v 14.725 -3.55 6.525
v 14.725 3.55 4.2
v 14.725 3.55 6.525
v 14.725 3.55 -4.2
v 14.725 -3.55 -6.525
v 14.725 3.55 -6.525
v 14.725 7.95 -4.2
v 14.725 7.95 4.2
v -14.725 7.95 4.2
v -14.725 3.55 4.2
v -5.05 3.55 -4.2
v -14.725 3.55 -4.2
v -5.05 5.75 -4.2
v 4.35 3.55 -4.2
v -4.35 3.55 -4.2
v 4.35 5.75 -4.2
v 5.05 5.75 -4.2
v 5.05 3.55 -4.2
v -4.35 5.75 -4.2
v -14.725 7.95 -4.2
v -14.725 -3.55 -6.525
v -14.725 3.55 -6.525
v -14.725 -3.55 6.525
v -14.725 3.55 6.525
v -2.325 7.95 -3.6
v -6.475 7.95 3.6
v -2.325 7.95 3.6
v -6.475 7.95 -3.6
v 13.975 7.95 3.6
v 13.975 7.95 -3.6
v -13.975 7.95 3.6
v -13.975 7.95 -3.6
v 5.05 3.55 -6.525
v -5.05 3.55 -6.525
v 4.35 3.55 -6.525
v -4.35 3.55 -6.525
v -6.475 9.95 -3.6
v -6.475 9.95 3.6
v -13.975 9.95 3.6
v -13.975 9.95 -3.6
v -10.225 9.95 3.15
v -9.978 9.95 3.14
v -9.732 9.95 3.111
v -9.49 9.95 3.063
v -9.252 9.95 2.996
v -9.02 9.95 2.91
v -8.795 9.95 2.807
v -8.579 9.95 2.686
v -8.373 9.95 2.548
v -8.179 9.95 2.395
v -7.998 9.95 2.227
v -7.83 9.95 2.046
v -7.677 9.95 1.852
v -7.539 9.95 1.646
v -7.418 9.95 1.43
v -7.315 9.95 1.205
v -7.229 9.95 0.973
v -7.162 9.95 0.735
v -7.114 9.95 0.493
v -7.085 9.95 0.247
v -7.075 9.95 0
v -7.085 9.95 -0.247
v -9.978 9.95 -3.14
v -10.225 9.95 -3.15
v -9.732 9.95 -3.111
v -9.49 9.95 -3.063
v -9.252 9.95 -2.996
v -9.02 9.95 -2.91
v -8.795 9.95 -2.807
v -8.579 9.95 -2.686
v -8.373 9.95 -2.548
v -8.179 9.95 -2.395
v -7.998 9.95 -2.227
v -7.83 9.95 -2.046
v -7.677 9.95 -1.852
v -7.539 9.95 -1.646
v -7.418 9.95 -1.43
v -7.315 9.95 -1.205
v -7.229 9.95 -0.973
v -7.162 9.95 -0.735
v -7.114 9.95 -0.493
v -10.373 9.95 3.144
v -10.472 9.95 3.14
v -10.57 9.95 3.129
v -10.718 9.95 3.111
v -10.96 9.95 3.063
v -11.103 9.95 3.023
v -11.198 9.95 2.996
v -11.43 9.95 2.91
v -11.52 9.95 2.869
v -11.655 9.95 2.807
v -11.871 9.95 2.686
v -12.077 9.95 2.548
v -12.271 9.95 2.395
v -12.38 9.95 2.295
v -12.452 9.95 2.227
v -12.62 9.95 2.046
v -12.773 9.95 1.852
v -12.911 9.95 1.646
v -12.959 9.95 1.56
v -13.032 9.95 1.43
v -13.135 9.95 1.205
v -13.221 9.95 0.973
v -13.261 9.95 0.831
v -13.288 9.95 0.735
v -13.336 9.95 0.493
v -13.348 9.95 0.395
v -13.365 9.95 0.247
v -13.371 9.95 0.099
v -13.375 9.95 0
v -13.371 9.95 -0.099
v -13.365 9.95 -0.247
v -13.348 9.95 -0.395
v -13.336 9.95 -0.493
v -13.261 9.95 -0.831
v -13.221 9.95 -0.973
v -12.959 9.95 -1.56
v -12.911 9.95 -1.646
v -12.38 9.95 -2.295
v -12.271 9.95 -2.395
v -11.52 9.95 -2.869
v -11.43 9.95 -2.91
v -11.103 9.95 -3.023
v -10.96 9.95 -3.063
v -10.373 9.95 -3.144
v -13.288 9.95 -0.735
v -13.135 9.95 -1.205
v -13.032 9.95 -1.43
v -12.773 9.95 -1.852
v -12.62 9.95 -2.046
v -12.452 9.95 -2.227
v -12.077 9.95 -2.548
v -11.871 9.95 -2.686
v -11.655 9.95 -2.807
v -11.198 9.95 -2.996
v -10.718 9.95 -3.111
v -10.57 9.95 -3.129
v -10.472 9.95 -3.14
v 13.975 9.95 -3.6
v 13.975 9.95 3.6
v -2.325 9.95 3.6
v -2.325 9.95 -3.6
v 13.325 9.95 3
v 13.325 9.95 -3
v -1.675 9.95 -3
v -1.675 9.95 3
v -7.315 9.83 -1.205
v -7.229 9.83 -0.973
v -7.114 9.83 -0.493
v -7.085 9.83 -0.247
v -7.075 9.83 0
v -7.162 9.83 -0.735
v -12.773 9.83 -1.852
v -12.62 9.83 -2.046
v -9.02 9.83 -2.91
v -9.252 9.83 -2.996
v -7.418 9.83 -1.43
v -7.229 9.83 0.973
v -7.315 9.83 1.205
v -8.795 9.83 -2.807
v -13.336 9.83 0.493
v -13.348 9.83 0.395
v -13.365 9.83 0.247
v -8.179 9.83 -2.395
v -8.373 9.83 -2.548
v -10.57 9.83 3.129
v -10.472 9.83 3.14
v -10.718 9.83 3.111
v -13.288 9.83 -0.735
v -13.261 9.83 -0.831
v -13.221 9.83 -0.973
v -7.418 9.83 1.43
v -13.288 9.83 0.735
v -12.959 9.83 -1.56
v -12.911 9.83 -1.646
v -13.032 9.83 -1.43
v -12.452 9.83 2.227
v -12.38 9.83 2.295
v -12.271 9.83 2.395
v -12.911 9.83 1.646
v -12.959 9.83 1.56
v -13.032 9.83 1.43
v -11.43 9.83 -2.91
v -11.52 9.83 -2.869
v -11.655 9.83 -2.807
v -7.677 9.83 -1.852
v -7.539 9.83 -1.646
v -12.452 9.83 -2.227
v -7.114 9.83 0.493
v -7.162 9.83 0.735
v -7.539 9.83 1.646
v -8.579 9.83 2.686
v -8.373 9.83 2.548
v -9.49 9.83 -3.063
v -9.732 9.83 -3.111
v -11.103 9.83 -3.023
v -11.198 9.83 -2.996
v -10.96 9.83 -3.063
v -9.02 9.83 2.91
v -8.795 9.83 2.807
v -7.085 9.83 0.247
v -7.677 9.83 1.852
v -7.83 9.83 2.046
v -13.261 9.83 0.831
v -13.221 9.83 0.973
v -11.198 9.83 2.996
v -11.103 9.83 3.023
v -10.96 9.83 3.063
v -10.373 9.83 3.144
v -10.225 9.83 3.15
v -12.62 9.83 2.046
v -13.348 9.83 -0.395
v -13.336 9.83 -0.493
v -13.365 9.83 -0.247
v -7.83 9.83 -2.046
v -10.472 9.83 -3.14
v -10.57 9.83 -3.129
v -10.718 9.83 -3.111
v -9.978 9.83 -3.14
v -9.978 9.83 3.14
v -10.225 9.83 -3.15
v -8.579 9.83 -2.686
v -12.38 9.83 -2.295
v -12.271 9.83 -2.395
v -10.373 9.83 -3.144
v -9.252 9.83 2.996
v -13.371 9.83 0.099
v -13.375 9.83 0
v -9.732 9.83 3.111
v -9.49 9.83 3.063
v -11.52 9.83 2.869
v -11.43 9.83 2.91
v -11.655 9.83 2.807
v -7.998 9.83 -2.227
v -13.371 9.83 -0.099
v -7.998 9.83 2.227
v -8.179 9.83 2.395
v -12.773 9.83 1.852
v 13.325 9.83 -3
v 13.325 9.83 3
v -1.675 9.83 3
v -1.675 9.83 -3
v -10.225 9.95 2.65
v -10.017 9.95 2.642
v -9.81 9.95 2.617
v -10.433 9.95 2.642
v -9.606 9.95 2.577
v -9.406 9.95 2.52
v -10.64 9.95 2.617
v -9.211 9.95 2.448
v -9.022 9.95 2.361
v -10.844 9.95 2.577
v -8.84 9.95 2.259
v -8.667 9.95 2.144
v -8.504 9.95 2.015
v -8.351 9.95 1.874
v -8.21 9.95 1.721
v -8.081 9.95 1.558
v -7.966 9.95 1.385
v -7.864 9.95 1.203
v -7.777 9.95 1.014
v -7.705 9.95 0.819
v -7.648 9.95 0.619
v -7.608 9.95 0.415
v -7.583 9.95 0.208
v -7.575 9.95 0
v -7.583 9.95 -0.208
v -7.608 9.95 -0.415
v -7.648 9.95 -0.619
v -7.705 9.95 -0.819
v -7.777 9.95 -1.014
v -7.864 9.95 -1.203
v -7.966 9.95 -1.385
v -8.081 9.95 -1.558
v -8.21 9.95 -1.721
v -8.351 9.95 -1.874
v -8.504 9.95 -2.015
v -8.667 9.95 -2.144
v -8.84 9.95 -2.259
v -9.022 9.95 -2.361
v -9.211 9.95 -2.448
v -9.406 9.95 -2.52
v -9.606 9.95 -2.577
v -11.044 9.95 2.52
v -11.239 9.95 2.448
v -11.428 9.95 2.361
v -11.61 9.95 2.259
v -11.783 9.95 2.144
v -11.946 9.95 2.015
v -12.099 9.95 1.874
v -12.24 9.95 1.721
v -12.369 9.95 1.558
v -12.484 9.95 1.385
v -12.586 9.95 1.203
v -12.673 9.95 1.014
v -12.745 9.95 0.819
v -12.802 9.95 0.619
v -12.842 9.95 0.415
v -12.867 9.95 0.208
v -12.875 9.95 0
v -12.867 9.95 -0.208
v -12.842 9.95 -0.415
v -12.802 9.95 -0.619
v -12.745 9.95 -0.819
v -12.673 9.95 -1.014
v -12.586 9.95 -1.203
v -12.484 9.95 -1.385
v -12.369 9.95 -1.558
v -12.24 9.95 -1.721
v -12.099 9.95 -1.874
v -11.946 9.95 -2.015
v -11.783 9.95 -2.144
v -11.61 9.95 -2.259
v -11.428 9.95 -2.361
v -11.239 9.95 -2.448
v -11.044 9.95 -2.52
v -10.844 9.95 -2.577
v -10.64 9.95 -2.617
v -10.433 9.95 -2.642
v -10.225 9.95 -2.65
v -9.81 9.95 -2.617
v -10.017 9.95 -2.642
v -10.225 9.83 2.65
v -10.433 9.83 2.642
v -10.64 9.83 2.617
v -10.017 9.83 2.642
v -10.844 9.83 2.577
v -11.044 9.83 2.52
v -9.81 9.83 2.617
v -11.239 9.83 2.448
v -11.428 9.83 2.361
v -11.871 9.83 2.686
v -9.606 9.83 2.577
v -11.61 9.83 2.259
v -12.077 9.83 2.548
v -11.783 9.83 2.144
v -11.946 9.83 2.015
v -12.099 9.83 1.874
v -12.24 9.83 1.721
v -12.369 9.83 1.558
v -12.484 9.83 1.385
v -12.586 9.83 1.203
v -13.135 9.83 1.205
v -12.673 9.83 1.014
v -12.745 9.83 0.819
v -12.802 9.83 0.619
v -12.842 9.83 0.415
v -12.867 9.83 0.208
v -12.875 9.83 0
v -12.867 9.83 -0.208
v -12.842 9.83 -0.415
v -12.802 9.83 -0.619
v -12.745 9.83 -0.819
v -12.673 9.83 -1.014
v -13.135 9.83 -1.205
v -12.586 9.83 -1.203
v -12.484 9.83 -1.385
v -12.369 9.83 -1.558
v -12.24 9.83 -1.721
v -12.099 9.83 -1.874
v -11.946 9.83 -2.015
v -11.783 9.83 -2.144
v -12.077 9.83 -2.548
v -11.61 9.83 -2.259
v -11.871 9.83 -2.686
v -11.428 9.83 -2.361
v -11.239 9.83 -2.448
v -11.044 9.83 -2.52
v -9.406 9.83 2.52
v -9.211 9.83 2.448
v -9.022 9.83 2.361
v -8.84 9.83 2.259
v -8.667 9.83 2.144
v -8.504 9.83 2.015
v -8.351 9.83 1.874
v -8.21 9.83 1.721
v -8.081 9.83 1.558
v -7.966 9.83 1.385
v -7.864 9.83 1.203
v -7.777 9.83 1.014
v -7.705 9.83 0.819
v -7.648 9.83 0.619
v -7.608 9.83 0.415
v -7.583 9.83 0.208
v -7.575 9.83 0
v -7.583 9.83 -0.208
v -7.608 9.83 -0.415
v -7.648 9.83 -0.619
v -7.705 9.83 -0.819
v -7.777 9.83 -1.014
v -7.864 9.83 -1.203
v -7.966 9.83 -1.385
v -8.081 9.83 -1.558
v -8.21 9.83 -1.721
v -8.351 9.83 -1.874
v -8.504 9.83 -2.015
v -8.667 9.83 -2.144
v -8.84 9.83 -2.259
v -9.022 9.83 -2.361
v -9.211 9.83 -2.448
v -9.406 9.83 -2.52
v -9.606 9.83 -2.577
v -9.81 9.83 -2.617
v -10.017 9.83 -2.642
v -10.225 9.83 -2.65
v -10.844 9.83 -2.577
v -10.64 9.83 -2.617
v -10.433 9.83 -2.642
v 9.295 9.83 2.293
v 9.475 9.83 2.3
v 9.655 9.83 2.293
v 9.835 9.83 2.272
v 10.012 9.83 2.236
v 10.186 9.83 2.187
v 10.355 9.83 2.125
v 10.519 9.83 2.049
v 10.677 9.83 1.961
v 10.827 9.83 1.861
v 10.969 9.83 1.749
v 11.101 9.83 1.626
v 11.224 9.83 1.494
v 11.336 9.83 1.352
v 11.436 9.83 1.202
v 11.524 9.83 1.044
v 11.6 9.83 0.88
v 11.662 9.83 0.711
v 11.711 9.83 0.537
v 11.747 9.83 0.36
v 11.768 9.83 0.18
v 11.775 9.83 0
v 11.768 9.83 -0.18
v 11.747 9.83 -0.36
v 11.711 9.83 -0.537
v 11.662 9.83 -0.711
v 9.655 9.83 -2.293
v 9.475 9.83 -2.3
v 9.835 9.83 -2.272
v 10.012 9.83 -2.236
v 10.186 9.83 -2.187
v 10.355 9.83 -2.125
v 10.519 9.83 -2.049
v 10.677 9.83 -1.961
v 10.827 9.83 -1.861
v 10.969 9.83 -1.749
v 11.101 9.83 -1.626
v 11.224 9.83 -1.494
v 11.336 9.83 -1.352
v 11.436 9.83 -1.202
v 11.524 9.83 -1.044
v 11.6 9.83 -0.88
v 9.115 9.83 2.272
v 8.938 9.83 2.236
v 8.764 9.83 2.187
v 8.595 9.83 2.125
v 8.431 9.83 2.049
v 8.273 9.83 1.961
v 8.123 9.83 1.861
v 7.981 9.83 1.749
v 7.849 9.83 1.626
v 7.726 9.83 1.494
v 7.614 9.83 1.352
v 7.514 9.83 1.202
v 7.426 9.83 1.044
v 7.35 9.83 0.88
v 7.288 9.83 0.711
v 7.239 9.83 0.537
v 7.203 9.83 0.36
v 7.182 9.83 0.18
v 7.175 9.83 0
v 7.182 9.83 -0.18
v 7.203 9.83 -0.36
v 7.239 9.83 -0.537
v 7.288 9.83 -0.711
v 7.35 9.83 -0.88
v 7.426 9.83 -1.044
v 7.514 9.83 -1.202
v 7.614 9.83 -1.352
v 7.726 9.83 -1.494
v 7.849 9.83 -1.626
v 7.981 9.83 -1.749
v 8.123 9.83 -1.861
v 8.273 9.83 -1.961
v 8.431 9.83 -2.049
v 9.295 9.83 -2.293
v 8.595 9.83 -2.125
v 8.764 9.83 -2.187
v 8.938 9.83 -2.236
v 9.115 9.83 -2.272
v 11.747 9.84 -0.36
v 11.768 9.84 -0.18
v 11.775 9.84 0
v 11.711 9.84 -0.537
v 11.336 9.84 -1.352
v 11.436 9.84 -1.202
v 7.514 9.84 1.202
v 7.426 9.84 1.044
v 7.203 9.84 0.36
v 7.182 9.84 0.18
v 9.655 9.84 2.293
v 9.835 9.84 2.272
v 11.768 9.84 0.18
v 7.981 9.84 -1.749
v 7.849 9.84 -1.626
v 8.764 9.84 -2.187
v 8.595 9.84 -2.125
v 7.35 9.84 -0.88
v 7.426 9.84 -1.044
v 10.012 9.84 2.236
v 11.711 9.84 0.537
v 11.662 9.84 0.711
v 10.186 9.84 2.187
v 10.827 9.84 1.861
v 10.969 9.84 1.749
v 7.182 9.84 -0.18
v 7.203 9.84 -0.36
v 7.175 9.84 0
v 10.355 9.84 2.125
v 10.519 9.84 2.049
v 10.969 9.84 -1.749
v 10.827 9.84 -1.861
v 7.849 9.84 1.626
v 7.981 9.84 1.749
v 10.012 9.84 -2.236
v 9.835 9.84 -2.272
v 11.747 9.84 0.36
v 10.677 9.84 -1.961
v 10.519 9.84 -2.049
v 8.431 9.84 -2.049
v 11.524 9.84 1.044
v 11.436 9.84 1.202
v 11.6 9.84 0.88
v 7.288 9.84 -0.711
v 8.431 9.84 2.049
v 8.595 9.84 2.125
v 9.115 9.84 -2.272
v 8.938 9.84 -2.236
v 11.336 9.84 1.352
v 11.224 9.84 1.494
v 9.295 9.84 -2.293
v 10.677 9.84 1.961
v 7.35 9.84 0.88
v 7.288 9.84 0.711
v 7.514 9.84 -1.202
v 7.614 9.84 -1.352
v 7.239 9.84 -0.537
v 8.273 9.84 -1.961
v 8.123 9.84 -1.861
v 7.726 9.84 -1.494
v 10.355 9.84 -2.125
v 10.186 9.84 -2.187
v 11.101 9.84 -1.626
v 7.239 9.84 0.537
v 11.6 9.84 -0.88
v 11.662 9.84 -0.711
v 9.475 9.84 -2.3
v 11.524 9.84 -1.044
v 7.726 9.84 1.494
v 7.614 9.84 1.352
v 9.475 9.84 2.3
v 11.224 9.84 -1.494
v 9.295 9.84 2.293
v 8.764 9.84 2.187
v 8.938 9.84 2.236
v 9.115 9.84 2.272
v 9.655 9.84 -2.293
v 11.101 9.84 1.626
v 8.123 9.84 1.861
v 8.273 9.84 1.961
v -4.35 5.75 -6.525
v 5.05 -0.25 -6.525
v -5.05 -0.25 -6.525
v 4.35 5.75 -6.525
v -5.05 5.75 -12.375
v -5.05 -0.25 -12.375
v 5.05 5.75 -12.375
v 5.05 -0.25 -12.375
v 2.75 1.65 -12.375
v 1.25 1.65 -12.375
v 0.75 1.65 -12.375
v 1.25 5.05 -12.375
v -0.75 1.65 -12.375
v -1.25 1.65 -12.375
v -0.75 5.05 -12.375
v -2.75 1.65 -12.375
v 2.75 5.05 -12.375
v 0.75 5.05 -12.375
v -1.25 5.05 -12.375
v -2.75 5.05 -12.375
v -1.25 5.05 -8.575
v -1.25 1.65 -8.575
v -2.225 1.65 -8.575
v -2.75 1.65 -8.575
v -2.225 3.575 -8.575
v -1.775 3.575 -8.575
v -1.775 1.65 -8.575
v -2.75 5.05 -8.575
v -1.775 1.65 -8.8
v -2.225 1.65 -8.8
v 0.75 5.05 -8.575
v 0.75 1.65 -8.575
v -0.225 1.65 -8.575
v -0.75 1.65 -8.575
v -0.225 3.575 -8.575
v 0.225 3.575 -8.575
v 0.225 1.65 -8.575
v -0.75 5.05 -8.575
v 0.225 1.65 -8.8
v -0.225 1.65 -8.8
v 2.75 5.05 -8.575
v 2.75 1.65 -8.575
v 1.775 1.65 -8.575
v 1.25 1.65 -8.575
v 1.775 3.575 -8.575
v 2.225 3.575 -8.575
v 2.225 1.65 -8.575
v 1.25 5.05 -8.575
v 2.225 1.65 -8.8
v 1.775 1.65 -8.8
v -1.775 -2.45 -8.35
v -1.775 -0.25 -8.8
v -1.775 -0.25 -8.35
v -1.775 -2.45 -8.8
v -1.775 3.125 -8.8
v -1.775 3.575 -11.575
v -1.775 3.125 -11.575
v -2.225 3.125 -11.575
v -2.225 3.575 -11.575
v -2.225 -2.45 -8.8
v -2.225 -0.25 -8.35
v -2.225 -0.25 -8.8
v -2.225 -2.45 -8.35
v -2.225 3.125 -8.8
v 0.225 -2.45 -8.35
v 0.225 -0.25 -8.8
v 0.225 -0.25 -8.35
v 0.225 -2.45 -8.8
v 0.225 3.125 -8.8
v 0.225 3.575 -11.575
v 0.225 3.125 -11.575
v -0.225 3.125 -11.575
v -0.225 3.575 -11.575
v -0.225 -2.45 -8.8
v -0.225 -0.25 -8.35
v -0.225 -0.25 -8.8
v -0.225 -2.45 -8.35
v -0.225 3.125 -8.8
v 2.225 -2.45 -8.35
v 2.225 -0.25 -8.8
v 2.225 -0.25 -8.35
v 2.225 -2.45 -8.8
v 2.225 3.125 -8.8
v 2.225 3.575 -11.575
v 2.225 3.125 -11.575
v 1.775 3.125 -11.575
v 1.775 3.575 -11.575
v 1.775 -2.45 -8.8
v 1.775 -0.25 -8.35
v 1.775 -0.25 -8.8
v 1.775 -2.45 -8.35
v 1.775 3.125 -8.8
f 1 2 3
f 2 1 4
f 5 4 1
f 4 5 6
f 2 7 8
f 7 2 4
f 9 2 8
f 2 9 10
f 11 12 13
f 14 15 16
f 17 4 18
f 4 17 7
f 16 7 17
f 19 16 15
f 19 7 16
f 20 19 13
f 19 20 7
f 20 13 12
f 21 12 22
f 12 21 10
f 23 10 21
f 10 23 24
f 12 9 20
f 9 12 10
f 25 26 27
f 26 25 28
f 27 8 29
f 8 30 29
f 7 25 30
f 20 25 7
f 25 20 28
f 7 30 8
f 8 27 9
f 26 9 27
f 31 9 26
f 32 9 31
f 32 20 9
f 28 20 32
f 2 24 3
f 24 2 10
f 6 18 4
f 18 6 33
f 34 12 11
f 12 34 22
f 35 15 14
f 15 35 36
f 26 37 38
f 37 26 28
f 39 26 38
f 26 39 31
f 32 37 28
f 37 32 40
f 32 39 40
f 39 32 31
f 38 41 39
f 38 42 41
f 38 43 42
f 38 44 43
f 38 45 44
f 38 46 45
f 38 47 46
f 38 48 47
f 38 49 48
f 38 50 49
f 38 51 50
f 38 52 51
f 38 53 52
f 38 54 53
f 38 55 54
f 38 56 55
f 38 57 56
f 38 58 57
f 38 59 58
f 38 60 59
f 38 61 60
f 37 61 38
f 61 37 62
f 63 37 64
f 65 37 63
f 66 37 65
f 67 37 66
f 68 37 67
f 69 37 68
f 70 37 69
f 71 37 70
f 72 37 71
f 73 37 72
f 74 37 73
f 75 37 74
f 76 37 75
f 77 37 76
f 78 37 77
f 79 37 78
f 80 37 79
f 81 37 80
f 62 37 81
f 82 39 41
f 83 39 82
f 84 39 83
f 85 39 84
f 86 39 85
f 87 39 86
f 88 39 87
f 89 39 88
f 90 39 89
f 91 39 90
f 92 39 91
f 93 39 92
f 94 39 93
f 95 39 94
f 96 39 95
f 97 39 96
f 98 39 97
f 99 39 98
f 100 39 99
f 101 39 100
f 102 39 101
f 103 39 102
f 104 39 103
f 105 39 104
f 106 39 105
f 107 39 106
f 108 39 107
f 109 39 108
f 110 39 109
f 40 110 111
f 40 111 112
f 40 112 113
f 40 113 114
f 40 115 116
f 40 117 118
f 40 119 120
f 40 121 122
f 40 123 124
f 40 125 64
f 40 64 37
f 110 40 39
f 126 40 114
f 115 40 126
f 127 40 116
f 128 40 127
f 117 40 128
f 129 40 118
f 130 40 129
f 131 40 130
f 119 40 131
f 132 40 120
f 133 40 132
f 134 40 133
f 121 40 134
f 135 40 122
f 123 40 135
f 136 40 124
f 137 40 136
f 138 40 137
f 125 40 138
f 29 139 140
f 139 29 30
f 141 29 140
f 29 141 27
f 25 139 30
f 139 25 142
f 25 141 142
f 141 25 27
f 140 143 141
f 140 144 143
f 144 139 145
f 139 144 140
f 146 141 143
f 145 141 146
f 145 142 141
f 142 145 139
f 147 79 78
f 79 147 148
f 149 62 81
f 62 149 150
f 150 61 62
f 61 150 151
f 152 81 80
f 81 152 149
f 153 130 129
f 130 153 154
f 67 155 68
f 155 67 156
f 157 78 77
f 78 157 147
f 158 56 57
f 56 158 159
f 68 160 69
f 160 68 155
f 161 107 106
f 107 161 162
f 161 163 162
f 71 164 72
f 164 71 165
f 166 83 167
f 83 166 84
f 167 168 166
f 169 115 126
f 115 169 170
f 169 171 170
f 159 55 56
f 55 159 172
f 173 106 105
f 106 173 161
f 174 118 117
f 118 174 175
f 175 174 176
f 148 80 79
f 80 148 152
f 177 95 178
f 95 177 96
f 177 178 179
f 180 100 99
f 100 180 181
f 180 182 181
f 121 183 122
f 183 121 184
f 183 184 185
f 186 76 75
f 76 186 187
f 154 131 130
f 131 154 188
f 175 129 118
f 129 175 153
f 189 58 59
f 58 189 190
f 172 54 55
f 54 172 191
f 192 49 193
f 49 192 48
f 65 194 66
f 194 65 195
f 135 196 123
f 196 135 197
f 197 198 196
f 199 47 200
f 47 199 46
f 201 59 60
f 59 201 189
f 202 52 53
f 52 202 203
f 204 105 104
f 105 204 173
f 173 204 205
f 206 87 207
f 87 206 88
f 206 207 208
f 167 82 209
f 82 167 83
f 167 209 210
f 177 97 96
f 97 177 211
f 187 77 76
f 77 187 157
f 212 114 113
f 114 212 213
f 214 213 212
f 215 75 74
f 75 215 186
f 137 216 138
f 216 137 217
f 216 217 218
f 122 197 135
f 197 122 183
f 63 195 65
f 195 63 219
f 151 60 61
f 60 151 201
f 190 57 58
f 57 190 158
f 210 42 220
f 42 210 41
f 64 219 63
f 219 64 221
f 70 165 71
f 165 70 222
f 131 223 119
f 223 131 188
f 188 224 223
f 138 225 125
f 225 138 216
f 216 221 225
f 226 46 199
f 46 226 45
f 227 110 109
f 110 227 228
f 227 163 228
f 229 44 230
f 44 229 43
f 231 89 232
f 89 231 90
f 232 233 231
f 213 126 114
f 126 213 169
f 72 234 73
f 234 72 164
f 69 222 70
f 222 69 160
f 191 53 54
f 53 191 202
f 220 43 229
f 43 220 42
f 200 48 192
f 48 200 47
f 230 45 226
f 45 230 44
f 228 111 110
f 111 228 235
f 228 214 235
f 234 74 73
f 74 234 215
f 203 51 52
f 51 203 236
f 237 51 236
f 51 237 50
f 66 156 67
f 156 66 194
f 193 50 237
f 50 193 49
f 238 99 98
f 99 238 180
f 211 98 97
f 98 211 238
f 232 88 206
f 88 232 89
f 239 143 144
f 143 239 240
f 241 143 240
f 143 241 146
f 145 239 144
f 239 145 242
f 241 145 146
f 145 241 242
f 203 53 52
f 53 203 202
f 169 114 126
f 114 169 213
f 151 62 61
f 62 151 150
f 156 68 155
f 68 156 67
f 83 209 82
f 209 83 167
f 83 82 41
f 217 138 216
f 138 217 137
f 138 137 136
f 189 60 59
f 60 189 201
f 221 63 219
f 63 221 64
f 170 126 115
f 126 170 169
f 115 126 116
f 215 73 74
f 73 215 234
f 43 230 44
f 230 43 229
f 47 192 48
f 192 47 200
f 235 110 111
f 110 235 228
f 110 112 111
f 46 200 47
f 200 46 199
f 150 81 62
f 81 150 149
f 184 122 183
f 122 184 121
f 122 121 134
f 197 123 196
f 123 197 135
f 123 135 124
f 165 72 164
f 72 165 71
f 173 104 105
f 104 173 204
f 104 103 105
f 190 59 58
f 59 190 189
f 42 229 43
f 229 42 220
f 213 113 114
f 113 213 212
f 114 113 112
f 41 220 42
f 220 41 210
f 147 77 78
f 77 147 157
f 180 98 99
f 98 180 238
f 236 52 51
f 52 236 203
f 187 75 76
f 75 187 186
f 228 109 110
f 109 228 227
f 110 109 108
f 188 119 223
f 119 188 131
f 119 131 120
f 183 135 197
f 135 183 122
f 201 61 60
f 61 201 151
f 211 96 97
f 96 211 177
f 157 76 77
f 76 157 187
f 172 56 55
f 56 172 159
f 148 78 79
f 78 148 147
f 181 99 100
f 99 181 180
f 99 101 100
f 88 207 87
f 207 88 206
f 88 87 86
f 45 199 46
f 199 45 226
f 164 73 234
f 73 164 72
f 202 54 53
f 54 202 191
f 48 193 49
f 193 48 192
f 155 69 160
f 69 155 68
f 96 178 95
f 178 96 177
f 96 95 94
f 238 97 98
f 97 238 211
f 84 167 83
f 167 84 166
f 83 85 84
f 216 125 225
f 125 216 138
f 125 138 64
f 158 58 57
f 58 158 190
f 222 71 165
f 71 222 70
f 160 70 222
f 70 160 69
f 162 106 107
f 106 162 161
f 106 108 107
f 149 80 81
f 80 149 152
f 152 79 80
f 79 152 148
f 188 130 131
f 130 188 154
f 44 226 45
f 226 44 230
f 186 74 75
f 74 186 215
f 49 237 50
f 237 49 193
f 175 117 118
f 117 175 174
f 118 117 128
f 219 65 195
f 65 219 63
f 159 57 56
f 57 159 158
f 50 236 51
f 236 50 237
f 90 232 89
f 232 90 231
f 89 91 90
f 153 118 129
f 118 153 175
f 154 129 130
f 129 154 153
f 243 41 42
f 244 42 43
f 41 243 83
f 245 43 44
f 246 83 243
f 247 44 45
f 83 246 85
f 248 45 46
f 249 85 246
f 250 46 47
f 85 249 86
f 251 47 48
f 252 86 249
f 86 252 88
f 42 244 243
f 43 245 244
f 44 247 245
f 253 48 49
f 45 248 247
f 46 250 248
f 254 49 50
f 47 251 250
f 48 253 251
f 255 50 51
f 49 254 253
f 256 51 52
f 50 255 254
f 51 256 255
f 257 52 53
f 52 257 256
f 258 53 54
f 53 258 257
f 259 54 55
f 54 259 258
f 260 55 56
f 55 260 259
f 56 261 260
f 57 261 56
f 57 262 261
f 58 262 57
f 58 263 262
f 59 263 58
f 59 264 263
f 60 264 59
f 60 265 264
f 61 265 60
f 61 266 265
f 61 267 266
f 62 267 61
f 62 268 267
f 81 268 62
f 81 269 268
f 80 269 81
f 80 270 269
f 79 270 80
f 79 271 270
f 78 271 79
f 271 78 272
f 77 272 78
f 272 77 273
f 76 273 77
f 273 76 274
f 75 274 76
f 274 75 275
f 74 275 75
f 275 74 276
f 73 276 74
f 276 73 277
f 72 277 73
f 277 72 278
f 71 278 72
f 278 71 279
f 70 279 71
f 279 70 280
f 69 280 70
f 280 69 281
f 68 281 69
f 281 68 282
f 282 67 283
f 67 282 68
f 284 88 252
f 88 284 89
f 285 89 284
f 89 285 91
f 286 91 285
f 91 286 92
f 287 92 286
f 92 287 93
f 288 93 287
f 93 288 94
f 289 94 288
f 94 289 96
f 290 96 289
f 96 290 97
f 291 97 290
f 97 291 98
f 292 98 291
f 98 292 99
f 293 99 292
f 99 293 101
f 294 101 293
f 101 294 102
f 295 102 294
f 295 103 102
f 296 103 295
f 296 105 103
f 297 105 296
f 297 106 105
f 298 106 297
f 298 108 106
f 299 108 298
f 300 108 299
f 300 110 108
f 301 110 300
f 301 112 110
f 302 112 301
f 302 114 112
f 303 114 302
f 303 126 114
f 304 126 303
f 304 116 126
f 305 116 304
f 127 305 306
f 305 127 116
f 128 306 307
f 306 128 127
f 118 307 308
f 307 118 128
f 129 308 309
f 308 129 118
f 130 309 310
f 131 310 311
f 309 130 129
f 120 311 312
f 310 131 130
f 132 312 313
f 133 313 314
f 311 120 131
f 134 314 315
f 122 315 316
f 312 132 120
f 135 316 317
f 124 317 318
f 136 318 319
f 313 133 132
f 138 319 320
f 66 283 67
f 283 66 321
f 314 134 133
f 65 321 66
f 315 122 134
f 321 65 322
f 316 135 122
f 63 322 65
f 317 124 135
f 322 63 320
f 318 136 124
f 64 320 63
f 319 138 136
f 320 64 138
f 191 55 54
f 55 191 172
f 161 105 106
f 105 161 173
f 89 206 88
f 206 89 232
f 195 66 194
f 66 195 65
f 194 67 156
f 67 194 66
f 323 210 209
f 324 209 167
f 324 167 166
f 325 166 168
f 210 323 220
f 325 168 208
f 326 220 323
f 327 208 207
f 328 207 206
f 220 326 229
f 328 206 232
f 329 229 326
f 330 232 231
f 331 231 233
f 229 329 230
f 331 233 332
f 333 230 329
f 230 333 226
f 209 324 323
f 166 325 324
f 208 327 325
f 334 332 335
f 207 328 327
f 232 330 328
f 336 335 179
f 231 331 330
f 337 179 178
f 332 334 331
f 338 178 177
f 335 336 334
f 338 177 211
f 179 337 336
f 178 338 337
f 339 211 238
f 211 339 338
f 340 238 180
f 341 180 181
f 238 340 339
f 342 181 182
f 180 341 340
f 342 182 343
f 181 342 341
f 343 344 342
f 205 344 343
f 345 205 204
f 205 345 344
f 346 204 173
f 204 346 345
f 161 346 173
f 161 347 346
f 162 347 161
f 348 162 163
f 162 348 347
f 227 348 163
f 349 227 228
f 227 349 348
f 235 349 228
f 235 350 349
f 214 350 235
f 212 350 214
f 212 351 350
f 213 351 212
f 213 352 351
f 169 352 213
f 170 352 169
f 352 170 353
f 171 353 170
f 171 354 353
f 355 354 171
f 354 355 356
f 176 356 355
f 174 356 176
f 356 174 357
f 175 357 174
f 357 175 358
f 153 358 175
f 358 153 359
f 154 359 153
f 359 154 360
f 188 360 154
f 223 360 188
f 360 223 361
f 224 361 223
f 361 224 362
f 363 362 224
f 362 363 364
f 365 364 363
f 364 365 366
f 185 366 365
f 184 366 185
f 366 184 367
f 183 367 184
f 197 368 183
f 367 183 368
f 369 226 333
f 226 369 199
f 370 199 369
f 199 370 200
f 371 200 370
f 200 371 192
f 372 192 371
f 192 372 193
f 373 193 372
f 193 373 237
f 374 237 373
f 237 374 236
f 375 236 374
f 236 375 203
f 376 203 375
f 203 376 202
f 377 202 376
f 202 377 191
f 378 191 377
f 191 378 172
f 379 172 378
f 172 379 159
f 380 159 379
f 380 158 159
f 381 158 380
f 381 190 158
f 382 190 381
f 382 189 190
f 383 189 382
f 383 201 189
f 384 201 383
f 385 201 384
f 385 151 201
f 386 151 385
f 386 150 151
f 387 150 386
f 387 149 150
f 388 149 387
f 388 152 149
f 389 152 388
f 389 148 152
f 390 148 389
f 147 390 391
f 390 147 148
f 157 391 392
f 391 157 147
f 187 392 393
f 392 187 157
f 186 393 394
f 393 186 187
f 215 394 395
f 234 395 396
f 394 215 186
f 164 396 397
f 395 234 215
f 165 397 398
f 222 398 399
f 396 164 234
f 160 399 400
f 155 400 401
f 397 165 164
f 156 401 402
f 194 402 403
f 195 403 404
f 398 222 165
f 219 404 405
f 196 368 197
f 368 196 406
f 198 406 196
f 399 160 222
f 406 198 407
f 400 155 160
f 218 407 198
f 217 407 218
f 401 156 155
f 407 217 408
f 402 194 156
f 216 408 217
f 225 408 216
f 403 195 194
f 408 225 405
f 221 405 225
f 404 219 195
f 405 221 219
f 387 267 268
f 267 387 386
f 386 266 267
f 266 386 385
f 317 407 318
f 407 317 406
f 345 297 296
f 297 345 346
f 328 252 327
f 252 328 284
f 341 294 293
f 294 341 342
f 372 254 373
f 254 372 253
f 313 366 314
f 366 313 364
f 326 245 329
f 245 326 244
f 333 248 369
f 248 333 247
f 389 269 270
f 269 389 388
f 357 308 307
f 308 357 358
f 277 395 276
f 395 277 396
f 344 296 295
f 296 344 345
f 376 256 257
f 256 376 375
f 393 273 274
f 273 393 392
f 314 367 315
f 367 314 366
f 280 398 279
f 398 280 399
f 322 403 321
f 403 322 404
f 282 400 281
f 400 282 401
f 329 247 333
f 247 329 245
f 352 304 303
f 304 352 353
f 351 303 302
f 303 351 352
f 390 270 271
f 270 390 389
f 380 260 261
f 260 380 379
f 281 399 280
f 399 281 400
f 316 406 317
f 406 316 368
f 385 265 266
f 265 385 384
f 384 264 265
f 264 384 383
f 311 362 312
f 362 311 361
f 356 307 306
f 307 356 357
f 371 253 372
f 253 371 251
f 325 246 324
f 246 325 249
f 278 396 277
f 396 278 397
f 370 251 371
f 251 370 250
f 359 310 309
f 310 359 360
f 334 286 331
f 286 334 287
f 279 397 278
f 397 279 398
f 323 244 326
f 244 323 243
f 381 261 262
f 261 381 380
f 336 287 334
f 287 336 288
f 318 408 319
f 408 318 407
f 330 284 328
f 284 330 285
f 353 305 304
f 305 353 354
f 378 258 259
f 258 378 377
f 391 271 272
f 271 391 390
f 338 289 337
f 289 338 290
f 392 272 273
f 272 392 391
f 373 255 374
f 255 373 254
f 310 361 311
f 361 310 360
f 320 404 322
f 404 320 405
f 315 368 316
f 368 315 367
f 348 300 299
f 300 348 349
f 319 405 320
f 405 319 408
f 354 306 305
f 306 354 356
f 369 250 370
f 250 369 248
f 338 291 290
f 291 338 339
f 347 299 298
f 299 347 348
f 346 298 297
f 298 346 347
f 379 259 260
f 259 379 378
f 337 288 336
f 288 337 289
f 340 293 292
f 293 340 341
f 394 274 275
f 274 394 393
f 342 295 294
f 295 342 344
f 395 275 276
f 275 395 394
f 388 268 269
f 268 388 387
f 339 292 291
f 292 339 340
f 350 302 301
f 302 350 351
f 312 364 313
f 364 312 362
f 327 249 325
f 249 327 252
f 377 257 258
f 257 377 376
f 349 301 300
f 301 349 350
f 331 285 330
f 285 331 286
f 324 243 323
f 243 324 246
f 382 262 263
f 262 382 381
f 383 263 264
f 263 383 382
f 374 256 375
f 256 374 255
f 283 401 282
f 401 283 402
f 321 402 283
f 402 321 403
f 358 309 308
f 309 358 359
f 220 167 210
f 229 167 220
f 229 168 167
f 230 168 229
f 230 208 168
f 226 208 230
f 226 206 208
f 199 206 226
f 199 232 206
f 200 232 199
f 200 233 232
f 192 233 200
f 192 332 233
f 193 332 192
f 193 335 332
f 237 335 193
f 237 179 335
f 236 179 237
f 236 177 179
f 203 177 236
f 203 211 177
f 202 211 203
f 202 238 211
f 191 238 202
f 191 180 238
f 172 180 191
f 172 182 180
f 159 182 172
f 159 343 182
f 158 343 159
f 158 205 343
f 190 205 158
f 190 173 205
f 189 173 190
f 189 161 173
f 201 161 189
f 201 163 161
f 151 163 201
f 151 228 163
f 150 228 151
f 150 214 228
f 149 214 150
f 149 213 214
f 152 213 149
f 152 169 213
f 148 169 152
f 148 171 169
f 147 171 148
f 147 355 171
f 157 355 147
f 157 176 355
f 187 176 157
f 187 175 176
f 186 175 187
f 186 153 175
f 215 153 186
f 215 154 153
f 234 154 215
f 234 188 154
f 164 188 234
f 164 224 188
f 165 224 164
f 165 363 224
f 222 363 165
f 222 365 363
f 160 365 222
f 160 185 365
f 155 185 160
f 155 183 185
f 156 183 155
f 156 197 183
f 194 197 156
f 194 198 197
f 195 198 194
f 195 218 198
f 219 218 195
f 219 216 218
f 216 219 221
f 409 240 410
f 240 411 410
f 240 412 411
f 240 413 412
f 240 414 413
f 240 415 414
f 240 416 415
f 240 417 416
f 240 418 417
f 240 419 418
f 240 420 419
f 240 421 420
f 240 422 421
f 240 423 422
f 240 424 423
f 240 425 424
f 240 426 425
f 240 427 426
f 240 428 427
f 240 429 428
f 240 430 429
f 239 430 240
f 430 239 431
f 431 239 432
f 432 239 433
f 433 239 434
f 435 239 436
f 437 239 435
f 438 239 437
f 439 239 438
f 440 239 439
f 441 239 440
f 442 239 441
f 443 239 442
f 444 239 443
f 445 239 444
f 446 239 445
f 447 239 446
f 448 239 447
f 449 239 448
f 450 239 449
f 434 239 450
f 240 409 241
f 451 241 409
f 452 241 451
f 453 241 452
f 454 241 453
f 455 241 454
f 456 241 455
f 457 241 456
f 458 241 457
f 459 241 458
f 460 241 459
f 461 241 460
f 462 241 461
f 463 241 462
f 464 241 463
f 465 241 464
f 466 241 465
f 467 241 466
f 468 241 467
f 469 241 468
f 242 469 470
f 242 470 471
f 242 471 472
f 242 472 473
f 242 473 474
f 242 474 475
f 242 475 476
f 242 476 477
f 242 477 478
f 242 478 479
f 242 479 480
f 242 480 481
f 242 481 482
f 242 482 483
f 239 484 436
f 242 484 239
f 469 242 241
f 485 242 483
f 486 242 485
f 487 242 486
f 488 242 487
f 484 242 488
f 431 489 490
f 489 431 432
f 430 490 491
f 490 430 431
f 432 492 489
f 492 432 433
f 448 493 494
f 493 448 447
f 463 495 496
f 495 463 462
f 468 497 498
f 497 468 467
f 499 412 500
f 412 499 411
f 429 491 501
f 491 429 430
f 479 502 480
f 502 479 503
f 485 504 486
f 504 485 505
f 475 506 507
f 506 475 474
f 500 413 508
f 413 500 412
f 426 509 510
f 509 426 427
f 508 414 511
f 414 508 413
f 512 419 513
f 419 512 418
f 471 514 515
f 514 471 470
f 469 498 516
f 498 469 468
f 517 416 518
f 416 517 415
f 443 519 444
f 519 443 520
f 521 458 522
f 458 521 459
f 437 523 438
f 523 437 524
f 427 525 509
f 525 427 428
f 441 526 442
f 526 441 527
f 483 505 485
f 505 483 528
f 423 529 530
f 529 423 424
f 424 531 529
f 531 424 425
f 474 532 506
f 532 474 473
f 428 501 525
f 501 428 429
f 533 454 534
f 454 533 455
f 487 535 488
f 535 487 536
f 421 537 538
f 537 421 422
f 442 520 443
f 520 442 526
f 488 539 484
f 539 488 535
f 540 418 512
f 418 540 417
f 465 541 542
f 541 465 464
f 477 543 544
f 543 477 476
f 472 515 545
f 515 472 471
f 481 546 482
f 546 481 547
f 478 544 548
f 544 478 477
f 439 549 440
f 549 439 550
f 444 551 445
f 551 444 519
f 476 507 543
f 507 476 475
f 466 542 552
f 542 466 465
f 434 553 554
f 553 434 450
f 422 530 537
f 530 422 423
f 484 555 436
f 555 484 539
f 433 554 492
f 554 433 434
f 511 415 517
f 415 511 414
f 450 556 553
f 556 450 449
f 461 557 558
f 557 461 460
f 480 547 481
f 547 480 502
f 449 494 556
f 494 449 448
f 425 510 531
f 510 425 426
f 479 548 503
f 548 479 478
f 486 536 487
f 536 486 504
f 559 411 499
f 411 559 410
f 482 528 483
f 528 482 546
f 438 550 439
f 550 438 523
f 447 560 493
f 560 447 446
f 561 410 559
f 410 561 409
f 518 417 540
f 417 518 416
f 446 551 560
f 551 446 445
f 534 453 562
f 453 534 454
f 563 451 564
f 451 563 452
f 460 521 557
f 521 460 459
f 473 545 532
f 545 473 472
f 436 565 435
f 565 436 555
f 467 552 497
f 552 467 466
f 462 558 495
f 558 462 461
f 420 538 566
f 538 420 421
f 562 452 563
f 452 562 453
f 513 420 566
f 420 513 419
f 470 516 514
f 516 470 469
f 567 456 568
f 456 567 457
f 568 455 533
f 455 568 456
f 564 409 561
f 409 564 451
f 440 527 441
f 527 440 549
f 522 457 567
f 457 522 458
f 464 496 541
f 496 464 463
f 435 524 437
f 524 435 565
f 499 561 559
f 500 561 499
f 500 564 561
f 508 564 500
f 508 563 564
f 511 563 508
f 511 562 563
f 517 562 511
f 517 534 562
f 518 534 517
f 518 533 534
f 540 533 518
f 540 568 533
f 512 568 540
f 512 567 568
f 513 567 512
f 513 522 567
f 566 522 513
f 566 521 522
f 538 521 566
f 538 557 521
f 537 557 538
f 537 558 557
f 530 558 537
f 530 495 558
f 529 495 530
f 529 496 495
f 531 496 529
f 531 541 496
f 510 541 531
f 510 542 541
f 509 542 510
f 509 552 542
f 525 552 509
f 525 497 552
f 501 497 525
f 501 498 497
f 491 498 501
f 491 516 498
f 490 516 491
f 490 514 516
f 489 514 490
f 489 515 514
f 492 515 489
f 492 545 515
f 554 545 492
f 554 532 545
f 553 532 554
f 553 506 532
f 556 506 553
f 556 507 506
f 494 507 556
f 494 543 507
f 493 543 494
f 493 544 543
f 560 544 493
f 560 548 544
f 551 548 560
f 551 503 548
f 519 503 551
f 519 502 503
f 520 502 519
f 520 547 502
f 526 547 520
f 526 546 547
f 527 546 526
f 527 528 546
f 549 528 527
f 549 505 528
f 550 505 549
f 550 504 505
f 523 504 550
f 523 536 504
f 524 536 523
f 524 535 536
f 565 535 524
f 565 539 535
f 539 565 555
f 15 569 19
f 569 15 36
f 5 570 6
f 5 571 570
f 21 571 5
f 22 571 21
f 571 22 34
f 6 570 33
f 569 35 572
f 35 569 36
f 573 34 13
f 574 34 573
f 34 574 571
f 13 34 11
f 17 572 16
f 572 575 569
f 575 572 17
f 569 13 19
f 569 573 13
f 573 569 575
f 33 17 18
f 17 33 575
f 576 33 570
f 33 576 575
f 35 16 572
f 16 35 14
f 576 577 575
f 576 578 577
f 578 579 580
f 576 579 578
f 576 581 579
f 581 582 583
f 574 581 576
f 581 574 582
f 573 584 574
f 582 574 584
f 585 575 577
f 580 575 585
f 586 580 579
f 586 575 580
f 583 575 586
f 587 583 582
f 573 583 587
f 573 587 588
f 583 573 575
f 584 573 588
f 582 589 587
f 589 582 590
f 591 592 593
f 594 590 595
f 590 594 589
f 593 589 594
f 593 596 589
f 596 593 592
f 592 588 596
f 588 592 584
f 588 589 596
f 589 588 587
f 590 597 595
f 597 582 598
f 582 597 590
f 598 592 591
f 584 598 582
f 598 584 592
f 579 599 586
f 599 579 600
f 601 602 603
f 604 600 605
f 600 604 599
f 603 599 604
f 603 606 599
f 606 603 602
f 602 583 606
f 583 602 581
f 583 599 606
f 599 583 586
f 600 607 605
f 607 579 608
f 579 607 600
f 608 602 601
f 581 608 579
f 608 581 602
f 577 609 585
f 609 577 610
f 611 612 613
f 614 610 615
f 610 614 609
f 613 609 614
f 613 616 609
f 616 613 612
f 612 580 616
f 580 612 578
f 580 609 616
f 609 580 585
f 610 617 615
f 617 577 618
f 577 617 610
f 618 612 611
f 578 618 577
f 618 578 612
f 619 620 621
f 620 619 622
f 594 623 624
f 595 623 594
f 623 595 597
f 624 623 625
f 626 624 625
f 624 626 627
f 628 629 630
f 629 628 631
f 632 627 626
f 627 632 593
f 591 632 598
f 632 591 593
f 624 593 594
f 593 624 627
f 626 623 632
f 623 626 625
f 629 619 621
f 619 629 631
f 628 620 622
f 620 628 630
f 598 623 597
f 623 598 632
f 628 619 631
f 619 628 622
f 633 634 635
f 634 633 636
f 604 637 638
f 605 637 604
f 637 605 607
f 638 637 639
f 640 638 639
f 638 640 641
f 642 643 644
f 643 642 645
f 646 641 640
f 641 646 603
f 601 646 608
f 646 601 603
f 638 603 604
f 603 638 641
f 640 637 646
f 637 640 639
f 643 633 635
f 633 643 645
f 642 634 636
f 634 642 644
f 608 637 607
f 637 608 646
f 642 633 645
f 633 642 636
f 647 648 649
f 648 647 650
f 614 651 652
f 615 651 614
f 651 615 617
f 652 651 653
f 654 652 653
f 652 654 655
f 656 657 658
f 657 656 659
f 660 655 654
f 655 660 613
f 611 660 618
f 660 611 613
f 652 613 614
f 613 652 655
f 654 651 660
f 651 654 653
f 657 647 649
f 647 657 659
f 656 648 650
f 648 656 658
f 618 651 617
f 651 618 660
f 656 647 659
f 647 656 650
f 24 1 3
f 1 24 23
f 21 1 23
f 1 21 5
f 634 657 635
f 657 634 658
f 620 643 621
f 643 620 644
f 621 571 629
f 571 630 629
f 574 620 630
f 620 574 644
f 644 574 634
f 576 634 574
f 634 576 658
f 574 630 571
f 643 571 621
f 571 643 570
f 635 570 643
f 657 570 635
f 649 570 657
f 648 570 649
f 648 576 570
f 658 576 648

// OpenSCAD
// Sharp GP2Y0D413K0F
// 単位: mm。本体ケースの中心を原点とし、前面を +Y、上面を +Z とする。
// 発光部は -X 側、受光部は +X 側。
// 指示のない公差: ±0.3 mm。
// 窓の細部、コネクタ内部および端子断面は、図の外観に基づく簡易表現。

$fn = 80;
eps = 0.01;

// ---------- 図面寸法 ----------
body_w = 29.45;
body_h = 13.05;
body_d = 7.1;                  // ±0.1
overall_d = 13.5;
overall_h = 18.9;

shoulder_h = 8.4;
nose_h = 7.2;
nose_d = 2;

emitter_nose_w = 7.5;
nose_gap = 4.15;
receiver_nose_w = 16.3;

connector_w = 10.1;
pwb_t = 1.2;
pwb_rear_offset = 3.3;         // 参考寸法

emitter_center_offset = 4.5;  // * レンズ中心の参照寸法
optical_center_pitch = 19.7;  // * レンズ中心間の参照寸法

// 全奥行き13.5と本体奥行き7.1を優先。
// 前方突出量は6.4となり、参考寸法(6.3)との差は0.1。
projection_d = overall_d - body_d;
shoulder_d = projection_d - nose_d;

// ---------- 図から概算した、寸法指示のない細部 ----------
emitter_aperture_d = 5.3;
emitter_bezel_d = 6.3;
receiver_aperture_w = 15.0;
receiver_aperture_h = 6.0;
receiver_optic_d = 4.6;
window_recess = 0.12;
lens_t = 0.45;

connector_d = 4.8;
connector_wall = 0.7;
pin_pitch = 2.0;
pin_size = 0.45;
socket_depth = 3.8;
solder_tail_length = 2.2;

// ---------- 基準位置 ----------
body_front = body_d / 2;
body_back = -body_d / 2;
body_bottom = -body_h / 2;

shoulder_front = body_front + shoulder_d;
lens_front = body_front + projection_d;
assembly_bottom = body_h / 2 - overall_h;

nose_margin =
    (body_w - emitter_nose_w - nose_gap - receiver_nose_w) / 2;

emitter_nose_left = -body_w / 2 + nose_margin;
receiver_nose_left =
    emitter_nose_left + emitter_nose_w + nose_gap;

emitter_x = -body_w / 2 + emitter_center_offset;
receiver_x = emitter_x + optical_center_pitch;

emitter_nose_x = emitter_nose_left + emitter_nose_w / 2;
receiver_nose_x = receiver_nose_left + receiver_nose_w / 2;

pwb_back = body_back + pwb_rear_offset;
pwb_front = pwb_back + pwb_t;
pwb_y = (pwb_back + pwb_front) / 2;
pwb_h = body_bottom - assembly_bottom;

connector_back = pwb_front;
connector_front = connector_back + connector_d;
connector_y = (connector_back + connector_front) / 2;
connector_h = body_bottom - assembly_bottom;

// ---------- 材料色 ----------
case_color = [0.075, 0.075, 0.08];
bezel_color = [0.12, 0.12, 0.13];
lens_color = [0.17, 0.055, 0.065];
optic_color = [0.24, 0.075, 0.085];
pwb_color = [0.43, 0.28, 0.12];
connector_color = [0.88, 0.87, 0.80];
metal_color = [0.73, 0.75, 0.77];

// +Y 方向の円柱
module cylinder_y(d, length) {
    rotate([-90, 0, 0])
        cylinder(d = d, h = length);
}

module block_between(x0, x1, y0, y1, z0, z1) {
    translate([x0, y0, z0])
        cube([x1 - x0, y1 - y0, z1 - z0]);
}

// ---------- 本体ケース: Carbonic ABS ----------
module main_case() {
    color(case_color)
        cube([body_w, body_d, body_h], center = true);
}

// ---------- 前面レンズケース ----------
module lens_case() {
    color(case_color)
    difference() {
        union() {
            // 本体から前方へ張り出す、幅いっぱいの段。
            translate([
                0,
                body_front + shoulder_d / 2,
                0
            ])
                cube(
                    [body_w, shoulder_d, shoulder_h],
                    center = true
                );

            // 発光部側の突起。
            translate([
                emitter_nose_x,
                shoulder_front + nose_d / 2,
                0
            ])
                cube(
                    [emitter_nose_w, nose_d, nose_h],
                    center = true
                );

            // 受光部側の突起。
            translate([
                receiver_nose_x,
                shoulder_front + nose_d / 2,
                0
            ])
                cube(
                    [receiver_nose_w, nose_d, nose_h],
                    center = true
                );
        }

        // 円形窓の座ぐり。
        translate([
            emitter_x,
            lens_front - lens_t - window_recess,
            0
        ])
            cylinder_y(
                emitter_bezel_d,
                lens_t + window_recess + eps
            );

        // 矩形窓。
        translate([
            receiver_nose_x,
            lens_front - (lens_t + window_recess) / 2 + eps / 2,
            0
        ])
            cube([
                receiver_aperture_w,
                lens_t + window_recess + eps,
                receiver_aperture_h
            ], center = true);
    }

    // 発光部の円形リム。前面から突出させない。
    color(bezel_color)
    translate([emitter_x, lens_front - window_recess, 0])
    difference() {
        cylinder_y(emitter_bezel_d, window_recess);
        translate([0, -eps, 0])
            cylinder_y(
                emitter_aperture_d,
                window_recess + 2 * eps
            );
    }
}

// ---------- 可視光カット樹脂レンズ ----------
module lenses() {
    // 左: 円形の発光窓。
    color(lens_color)
    translate([
        emitter_x,
        lens_front - window_recess - lens_t,
        0
    ])
        cylinder_y(emitter_bezel_d, lens_t);

    // 右: 矩形の受光窓。
    color(lens_color)
    translate([
        receiver_nose_x,
        lens_front - window_recess - lens_t / 2,
        0
    ])
        cube([
            receiver_aperture_w,
            lens_t,
            receiver_aperture_h
        ], center = true);

    // 図中の *19.7 で指定される受光光学中心。
    // 矩形窓内に見える円形部分を薄い面として簡易表現。
    color(optic_color)
    translate([
        receiver_x,
        lens_front - window_recess - eps,
        0
    ])
        cylinder_y(receiver_optic_d, 2 * eps);
}

// ---------- PWB: 紙フェノール薄板 ----------
// 側面図の1.2はY方向の板厚。
// 基板は水平板ではなく、下方へ延びるXZ平面の薄板。
module pwb() {
    color(pwb_color)
    translate([
        0,
        pwb_y,
        assembly_bottom + pwb_h / 2
    ])
        cube([connector_w, pwb_t, pwb_h], center = true);
}

// ---------- JCTC 12001W90-3P-HF: 簡易3極コネクタ ----------
module connector() {
    color(connector_color)
    difference() {
        union() {
            translate([
                0,
                connector_y,
                assembly_bottom + connector_h / 2
            ])
                cube([
                    connector_w,
                    connector_d,
                    connector_h
                ], center = true);

            // 前面図に見える左右の立ち上がり。
            for (side = [-1, 1])
                translate([
                    side * (connector_w / 2 - connector_wall / 2),
                    (body_front + connector_front) / 2,
                    (body_bottom - shoulder_h / 2) / 2
                ])
                    cube([
                        connector_wall,
                        connector_front - body_front,
                        -shoulder_h / 2 - body_bottom
                    ], center = true);
        }

        // 下向きに開口する3極の嵌合部。
        for (i = [-1, 0, 1])
            translate([
                i * pin_pitch,
                connector_y,
                assembly_bottom + socket_depth / 2 - eps / 2
            ])
                cube([
                    1.5,
                    connector_d - 2 * connector_wall,
                    socket_depth + eps
                ], center = true);
    }

    color(metal_color)
    for (i = [-1, 0, 1]) {
        // 嵌合部内の接点。下端より突出させない。
        block_between(
            i * pin_pitch - pin_size / 2,
            i * pin_pitch + pin_size / 2,
            connector_y - pin_size / 2,
            connector_y + pin_size / 2,
            assembly_bottom + 0.8,
            assembly_bottom + socket_depth + 0.2
        );

        // ライトアングル端子の基板側の脚。
        block_between(
            i * pin_pitch - pin_size / 2,
            i * pin_pitch + pin_size / 2,
            pwb_back - solder_tail_length,
            connector_y + pin_size / 2,
            assembly_bottom + socket_depth - pin_size / 2,
            assembly_bottom + socket_depth + pin_size / 2
        );
    }
}

// ---------- 組み立て ----------
main_case();
lens_case();
lenses();
pwb();
connector();
